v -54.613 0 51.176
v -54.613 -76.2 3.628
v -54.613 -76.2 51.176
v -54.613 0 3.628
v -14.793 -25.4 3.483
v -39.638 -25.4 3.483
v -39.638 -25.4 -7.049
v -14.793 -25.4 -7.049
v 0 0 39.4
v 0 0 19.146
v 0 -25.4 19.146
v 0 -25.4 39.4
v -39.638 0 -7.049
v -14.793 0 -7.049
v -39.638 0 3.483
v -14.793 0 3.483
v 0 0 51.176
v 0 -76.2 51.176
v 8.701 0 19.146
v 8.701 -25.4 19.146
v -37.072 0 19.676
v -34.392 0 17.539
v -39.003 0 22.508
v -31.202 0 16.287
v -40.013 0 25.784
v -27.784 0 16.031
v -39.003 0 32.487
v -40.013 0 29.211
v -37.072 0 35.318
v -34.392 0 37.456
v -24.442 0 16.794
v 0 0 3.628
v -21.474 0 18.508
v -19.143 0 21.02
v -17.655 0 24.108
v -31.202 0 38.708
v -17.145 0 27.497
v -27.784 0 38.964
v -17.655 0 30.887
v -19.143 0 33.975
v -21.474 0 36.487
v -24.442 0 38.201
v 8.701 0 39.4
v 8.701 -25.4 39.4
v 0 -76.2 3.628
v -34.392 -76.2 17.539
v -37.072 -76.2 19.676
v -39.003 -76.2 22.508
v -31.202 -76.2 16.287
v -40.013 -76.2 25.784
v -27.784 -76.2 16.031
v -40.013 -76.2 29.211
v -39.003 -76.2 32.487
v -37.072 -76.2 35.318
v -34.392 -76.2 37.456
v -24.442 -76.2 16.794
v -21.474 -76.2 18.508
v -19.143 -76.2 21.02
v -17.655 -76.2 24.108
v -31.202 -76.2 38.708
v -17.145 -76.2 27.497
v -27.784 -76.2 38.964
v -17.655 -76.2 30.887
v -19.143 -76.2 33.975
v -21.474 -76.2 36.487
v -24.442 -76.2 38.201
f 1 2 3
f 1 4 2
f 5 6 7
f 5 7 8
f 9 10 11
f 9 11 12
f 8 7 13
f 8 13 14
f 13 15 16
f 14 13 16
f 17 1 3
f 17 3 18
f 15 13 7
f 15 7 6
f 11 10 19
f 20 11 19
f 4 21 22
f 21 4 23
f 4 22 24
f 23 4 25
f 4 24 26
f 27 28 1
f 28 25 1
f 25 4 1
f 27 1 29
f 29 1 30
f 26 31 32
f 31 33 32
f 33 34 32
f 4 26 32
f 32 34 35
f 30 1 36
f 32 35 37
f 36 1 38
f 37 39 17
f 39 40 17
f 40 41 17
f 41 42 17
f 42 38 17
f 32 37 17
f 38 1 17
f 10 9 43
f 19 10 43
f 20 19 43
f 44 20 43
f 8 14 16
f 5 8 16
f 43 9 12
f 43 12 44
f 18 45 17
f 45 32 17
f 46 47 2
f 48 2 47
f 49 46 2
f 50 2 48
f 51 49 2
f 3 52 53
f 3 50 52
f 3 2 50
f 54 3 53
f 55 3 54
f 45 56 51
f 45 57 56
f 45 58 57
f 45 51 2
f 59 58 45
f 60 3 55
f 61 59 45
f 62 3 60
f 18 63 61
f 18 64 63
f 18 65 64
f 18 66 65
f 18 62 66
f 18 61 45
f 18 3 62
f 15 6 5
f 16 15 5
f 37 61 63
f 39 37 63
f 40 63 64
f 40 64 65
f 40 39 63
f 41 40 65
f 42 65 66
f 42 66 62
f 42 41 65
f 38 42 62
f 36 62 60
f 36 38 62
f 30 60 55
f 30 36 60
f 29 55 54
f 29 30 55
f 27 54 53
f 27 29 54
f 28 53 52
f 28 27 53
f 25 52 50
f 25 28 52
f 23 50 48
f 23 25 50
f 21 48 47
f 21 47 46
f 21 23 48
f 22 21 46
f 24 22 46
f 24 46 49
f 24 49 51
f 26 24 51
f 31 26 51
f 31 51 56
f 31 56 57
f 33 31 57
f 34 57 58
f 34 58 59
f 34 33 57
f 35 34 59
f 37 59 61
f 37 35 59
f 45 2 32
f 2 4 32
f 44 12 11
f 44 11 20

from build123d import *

# Parameters (mm, degrees)
F1_W     = 8.7014986202
F1_H     = 20.2537979931
F2_DEPTH = 25.4
F1_W_2   = 24.8446604237
F1_H_2   = 10.5319754221
F0_W     = 54.6130314469
F0_H     = 47.5477091968
F0_R     = 11.4985783996
F3_DEPTH = 50.8


with BuildPart() as f2:
    # F1 (on Front) → F2 (new body)
    with BuildSketch(Plane.XZ):
        with Locations((4.3507493101, 29.273130931)):
            Rectangle(F1_W, F1_H)
    extrude(amount=F2_DEPTH)


with BuildPart() as f2b:
    # F1 (on Front) → F2, piece 2 (new body)
    with BuildSketch(Plane.XZ):
        with Locations((-27.2152391262, -1.7826945987)):
            Rectangle(F1_W_2, F1_H_2)
    extrude(amount=F2_DEPTH)


with BuildPart() as f2c:
    # F0 (on Front) → F2, piece 3 (new body)
    with BuildSketch(Plane.XZ):
        with Locations((-27.3065157235, 27.4019930512)):
            Rectangle(F0_W, F0_H)
        with Locations((-28.6431983113, 27.4974703789)):
            Circle(F0_R, mode=Mode.SUBTRACT)
    extrude(amount=F2_DEPTH)

    # F3 (add): a face of the model
    f3_faces = [f2c.faces().sort_by_distance(p)[0] for p in [
        (-27.3065157235, -25.4, 50.4517366185),
    ]]
    extrude(f3_faces, amount=F3_DEPTH)


solid = Compound([f2.part, f2b.part, f2c.part])
